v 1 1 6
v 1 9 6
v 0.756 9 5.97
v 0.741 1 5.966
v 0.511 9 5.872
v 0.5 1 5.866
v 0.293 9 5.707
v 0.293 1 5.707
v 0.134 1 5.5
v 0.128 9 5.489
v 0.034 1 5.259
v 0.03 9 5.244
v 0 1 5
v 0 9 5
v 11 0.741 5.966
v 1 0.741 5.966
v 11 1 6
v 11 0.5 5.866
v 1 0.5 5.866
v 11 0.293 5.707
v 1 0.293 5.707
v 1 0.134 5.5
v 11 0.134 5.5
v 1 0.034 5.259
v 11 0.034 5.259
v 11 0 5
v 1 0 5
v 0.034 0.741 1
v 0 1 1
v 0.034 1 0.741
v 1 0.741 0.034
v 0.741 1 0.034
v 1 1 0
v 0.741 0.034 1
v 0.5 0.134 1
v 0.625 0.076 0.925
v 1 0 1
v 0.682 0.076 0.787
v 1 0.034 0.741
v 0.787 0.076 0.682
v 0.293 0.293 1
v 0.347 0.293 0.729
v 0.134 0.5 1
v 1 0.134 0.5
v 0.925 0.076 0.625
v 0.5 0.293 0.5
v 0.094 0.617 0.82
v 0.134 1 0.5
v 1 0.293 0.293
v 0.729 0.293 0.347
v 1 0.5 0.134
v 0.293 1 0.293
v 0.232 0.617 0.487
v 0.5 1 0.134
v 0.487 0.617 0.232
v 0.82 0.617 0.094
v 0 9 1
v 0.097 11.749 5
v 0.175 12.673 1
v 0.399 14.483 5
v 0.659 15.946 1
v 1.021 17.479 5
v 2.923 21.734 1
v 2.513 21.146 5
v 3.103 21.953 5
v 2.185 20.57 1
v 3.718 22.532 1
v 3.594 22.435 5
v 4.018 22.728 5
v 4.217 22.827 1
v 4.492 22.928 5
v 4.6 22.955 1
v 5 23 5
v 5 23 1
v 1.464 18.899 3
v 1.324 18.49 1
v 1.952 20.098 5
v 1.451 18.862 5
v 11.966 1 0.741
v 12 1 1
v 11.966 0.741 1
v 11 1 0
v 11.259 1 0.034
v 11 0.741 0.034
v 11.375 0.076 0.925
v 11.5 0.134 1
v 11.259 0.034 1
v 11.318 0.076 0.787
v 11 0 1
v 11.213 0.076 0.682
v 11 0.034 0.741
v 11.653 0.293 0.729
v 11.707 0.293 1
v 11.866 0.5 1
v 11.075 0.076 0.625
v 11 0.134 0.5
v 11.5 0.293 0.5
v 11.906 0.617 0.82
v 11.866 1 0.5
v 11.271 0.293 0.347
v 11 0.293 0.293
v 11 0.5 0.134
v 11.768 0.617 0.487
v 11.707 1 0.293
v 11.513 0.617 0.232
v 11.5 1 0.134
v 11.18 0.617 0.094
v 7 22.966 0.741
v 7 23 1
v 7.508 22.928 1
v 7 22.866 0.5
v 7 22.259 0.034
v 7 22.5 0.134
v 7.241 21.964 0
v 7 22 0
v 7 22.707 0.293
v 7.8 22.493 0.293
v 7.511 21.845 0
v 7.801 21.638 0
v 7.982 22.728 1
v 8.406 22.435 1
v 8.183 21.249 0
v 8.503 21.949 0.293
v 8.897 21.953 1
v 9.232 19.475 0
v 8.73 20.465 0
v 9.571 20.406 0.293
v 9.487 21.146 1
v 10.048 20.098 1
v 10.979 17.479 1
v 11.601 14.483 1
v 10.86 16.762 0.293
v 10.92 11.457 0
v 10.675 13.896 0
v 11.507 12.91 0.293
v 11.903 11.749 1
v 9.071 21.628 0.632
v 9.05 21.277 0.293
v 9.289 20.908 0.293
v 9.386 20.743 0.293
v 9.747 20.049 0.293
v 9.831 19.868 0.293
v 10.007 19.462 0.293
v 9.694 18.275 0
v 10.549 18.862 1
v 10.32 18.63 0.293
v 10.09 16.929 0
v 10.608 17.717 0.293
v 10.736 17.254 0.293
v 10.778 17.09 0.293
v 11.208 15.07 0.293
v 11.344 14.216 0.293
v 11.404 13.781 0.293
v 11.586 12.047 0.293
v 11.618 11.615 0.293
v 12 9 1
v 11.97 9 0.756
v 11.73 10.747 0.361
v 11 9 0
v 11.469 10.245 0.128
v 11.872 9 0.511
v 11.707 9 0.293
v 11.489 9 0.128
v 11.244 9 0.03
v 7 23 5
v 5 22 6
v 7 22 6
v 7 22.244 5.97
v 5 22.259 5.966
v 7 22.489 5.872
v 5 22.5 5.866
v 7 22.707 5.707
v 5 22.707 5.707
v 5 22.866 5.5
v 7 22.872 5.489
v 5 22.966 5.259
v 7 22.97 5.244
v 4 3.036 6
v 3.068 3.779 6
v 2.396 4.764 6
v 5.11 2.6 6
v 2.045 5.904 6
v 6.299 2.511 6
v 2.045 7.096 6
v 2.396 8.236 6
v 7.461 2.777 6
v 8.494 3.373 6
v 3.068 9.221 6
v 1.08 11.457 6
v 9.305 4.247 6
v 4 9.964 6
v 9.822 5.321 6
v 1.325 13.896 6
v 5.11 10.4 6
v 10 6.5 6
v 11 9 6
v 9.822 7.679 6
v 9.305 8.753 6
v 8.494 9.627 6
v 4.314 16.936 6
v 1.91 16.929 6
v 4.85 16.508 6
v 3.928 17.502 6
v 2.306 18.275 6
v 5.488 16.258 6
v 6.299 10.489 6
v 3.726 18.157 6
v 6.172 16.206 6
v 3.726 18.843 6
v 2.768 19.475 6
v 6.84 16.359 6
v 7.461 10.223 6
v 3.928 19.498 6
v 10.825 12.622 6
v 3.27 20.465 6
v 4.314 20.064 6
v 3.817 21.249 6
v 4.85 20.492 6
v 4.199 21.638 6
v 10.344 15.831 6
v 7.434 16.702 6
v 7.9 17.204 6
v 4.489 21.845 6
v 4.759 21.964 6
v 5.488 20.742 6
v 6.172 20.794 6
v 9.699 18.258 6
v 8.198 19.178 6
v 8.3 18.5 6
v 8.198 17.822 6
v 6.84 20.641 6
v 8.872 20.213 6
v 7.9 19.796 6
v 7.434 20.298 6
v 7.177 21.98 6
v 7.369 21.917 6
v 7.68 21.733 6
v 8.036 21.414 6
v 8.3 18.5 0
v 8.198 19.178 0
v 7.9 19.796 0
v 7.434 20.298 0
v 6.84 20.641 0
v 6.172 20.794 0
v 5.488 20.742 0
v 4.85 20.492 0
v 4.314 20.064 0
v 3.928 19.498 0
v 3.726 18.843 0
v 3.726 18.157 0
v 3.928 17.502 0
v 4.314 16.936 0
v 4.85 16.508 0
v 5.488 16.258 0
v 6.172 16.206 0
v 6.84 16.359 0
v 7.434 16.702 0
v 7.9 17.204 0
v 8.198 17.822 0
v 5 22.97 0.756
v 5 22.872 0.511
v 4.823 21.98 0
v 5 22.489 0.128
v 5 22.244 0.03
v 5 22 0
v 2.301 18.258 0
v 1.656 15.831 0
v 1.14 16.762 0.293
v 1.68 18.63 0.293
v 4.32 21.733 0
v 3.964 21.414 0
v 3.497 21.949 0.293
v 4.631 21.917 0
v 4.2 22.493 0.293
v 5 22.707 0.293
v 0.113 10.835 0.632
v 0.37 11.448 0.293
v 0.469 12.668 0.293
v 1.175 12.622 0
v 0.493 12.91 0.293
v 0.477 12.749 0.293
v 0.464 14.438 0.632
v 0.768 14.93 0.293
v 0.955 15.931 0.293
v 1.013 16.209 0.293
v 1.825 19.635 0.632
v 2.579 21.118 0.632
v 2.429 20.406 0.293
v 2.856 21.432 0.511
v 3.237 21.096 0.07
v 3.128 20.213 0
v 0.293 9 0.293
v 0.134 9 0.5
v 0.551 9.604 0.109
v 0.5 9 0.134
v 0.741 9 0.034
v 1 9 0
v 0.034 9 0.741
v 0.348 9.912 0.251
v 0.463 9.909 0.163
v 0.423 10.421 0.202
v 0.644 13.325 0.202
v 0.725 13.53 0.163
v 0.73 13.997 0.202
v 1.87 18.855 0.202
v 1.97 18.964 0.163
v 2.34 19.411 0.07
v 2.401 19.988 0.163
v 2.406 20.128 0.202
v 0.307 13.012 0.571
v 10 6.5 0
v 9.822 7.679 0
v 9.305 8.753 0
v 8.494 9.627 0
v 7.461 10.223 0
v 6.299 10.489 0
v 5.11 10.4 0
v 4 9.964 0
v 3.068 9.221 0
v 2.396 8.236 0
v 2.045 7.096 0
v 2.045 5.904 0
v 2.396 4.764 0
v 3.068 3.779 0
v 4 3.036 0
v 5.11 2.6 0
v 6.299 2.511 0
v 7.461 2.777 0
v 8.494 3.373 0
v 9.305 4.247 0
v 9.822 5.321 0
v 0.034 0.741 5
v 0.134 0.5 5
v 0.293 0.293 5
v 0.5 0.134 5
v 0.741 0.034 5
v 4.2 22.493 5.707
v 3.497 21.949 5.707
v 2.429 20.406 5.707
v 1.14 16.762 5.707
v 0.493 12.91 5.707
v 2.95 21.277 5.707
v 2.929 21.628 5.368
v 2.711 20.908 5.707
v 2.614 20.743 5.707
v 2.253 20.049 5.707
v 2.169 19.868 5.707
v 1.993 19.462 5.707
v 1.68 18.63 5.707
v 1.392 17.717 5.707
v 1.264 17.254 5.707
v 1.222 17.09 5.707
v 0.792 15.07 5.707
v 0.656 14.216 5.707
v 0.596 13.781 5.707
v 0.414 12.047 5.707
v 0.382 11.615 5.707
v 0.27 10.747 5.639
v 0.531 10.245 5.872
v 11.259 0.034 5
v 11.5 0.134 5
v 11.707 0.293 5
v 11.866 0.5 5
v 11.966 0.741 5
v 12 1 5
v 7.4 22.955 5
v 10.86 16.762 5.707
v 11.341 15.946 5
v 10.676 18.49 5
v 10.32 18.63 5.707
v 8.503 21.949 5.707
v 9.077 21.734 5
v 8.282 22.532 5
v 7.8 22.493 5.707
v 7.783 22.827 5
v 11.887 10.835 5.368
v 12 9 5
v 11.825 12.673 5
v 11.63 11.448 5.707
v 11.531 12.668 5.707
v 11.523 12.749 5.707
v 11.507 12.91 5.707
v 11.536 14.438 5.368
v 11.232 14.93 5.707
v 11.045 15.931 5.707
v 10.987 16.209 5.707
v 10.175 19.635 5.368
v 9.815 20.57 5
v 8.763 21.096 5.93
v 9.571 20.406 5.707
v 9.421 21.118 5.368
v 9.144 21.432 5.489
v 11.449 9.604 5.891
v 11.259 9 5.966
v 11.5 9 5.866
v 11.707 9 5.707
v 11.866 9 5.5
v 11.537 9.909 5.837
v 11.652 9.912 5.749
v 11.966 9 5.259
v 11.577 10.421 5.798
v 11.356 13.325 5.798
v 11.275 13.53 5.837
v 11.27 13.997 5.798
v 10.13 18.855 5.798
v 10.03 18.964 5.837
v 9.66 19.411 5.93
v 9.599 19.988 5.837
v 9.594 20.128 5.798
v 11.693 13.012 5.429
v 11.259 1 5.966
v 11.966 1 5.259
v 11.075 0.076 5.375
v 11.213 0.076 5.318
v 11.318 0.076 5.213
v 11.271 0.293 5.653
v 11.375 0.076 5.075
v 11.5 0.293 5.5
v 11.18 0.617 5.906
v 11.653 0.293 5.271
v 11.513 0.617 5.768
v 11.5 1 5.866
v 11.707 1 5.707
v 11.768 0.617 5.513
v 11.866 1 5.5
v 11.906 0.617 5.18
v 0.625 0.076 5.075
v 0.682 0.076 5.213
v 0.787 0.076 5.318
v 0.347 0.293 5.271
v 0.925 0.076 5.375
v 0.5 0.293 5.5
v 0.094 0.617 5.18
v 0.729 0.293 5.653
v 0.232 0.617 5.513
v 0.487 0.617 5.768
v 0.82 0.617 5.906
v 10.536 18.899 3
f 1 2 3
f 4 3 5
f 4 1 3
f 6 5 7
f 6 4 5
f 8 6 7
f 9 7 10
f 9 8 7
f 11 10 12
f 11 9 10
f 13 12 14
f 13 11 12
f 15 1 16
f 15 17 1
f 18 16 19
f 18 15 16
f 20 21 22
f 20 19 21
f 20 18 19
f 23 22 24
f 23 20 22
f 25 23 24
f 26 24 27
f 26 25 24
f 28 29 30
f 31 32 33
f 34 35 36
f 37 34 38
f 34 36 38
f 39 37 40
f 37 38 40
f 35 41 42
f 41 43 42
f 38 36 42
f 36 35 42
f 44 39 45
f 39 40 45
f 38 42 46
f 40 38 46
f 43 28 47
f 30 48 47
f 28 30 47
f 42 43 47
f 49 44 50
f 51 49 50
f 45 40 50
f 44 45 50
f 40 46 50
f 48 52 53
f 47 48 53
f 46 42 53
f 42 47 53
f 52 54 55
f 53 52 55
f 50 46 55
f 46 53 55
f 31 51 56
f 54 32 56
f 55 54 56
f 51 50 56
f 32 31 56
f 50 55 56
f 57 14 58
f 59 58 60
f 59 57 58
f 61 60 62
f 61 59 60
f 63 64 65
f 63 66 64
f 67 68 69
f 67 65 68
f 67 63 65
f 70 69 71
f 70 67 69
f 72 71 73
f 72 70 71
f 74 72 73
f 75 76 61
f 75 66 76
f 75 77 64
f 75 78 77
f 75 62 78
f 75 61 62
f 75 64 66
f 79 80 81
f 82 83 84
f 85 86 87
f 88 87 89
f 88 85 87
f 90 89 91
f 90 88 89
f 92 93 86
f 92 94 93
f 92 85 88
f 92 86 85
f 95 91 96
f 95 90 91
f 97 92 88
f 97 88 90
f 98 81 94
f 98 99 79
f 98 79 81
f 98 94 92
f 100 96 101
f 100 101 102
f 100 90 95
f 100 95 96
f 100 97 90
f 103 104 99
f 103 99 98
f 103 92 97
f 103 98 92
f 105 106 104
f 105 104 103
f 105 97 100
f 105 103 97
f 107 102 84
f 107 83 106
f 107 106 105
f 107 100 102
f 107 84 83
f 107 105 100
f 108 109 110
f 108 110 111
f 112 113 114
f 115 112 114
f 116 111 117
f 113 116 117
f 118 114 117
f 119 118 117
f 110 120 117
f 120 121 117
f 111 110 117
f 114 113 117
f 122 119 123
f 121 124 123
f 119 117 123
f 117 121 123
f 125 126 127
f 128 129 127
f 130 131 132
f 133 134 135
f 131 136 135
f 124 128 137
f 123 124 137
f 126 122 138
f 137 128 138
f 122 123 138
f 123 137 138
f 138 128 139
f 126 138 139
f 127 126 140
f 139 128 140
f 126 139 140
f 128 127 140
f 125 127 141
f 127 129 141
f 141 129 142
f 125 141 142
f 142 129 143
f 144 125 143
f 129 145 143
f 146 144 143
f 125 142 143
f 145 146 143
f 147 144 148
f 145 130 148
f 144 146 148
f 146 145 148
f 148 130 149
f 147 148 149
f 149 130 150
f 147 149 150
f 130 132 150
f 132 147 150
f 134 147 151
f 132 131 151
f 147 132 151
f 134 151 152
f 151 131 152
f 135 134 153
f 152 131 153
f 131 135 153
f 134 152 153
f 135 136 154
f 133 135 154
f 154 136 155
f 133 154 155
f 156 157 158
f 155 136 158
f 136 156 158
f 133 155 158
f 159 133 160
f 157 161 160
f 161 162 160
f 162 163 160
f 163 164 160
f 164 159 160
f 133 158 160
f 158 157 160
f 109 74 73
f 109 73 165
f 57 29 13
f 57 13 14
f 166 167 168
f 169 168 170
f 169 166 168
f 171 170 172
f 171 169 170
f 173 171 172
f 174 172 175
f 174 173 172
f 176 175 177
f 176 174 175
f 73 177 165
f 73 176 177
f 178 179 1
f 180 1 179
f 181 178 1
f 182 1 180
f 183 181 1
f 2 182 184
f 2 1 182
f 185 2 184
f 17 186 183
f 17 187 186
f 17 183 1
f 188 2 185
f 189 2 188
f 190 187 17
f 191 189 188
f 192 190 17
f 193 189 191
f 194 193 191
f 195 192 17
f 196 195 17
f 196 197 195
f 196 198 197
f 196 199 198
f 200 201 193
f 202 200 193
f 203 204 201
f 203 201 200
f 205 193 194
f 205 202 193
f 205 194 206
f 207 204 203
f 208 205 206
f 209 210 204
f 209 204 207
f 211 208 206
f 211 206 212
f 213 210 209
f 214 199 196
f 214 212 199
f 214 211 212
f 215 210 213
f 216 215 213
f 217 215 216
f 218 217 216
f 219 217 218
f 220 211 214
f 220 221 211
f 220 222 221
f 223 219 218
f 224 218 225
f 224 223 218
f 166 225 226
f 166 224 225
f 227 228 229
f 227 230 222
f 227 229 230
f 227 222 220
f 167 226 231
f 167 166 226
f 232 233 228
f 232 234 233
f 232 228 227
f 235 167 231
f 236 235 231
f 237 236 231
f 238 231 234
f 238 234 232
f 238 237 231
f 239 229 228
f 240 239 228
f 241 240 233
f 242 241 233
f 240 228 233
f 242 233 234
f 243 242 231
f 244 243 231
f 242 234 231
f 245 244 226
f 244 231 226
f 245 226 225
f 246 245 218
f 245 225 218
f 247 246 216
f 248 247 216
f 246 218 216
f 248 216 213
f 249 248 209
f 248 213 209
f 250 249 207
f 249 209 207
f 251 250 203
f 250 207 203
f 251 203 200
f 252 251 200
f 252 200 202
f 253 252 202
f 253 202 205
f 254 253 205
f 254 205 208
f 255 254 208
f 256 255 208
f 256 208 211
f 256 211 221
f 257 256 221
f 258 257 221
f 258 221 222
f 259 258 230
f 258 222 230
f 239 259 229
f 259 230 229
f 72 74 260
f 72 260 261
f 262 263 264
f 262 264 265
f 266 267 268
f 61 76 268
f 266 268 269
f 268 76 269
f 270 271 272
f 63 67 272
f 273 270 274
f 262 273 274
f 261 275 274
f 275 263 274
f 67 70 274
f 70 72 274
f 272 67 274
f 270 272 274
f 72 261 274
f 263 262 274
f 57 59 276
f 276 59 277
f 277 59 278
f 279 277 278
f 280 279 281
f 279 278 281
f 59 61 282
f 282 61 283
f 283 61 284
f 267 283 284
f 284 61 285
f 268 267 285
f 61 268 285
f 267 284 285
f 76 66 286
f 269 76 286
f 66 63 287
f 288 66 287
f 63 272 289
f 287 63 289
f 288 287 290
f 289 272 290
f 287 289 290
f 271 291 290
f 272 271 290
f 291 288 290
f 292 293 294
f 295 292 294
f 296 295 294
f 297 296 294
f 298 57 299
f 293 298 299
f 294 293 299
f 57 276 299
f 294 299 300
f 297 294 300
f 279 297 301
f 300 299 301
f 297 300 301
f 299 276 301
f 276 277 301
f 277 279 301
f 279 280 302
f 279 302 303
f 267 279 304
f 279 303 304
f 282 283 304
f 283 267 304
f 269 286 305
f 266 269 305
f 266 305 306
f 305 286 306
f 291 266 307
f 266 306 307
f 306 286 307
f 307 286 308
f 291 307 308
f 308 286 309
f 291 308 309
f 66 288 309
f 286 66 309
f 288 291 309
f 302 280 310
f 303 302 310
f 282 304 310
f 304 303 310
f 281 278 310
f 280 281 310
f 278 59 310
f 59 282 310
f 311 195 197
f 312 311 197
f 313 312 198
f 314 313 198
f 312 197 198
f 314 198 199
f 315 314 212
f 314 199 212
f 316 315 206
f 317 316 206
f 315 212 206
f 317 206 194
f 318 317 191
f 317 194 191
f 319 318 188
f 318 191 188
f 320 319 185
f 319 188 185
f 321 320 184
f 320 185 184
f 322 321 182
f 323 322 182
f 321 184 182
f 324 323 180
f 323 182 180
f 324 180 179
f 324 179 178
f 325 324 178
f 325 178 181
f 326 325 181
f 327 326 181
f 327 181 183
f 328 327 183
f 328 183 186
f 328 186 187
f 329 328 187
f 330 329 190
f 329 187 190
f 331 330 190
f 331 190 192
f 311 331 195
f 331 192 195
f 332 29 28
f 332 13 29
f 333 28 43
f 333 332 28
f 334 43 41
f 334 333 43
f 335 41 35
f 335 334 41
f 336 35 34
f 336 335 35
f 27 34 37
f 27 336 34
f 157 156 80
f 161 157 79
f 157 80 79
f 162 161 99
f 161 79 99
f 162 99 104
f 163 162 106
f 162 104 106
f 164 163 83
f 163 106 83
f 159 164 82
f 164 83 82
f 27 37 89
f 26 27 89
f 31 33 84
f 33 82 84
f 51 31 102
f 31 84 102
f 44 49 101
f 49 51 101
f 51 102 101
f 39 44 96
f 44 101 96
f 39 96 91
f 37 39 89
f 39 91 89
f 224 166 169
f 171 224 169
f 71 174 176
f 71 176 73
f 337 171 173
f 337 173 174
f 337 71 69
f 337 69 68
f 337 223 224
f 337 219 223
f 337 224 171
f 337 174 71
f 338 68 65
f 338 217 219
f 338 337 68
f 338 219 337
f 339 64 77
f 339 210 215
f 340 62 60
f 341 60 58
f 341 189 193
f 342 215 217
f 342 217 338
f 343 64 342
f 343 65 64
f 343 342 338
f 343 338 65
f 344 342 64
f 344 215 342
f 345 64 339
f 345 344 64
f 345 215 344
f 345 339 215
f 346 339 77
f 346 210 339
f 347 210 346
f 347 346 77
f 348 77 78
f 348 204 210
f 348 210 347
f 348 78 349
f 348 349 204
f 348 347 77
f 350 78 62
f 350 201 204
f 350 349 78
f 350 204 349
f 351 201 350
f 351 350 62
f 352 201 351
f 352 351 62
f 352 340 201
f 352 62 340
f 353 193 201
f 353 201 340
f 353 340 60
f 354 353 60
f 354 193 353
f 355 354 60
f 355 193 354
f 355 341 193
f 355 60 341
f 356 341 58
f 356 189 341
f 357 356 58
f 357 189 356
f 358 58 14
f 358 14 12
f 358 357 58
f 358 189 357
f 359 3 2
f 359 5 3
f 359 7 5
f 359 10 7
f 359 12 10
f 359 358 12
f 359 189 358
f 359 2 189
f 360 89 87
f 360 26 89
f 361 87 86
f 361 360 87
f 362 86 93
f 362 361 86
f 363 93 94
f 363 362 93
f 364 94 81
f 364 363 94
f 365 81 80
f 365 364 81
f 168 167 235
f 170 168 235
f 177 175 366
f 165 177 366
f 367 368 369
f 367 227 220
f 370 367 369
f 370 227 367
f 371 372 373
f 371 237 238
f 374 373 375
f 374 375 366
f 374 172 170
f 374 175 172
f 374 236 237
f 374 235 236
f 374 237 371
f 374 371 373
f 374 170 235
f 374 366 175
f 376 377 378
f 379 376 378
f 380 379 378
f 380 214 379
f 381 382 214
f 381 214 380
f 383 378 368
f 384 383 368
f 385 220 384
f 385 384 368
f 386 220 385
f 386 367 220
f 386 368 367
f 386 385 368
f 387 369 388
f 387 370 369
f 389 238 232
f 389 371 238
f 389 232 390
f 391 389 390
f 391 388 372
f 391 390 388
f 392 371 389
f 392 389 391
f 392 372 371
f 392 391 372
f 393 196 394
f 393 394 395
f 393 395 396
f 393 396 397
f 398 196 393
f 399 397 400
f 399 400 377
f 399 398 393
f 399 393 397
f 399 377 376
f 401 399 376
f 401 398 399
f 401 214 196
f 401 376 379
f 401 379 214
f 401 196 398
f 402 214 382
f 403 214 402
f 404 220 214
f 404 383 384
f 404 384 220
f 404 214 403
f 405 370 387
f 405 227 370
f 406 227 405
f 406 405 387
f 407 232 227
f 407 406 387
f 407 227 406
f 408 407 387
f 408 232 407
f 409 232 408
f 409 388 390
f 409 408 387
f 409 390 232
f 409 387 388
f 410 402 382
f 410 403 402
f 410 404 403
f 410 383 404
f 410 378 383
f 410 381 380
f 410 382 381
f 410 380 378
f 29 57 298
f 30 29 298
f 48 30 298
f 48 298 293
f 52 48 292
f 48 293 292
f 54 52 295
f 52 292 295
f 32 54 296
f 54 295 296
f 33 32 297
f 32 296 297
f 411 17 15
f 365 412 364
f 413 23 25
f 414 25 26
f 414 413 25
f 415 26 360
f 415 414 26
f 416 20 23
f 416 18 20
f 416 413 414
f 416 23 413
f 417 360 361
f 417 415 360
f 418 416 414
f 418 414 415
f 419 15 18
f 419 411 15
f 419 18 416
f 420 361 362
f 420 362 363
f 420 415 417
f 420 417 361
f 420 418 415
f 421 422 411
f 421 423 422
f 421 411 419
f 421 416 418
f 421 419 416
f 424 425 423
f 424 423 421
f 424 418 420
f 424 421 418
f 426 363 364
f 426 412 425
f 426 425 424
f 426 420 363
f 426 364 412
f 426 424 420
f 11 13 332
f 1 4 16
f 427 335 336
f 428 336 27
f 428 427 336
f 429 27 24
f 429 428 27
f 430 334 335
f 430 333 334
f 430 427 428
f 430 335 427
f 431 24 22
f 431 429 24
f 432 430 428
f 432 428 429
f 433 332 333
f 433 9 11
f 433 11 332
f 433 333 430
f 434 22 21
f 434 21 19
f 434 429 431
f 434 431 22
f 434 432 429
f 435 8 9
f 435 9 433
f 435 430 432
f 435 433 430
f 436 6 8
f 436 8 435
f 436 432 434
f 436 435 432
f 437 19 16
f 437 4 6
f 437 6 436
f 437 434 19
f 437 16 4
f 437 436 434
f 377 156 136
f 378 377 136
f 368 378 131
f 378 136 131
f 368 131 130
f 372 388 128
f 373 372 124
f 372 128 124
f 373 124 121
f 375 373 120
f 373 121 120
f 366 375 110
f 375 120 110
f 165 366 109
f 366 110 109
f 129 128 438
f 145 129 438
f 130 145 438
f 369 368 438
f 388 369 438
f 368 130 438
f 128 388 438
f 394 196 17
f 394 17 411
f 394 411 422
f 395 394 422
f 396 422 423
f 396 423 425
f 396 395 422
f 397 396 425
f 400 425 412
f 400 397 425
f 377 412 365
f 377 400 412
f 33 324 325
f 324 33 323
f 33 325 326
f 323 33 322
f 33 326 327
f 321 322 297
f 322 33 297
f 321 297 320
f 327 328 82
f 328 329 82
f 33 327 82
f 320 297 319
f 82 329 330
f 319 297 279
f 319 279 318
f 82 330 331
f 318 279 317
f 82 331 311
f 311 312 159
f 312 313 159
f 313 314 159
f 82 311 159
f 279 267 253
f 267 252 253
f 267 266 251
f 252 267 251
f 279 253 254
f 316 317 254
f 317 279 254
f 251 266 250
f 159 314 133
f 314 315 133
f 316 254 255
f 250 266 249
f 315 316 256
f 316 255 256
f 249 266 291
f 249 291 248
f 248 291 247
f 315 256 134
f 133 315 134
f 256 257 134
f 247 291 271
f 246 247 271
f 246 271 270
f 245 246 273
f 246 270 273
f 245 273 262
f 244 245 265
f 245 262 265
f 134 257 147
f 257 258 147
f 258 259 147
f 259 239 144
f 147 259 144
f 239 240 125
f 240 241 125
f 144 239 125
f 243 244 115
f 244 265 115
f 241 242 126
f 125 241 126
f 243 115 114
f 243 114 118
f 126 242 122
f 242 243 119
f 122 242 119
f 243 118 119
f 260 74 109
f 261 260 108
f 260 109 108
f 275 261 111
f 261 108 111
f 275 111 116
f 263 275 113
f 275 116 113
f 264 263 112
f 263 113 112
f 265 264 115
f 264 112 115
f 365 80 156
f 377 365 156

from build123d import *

# Parameters (mm, degrees)
SKETCH1_W            = 12
SKETCH1_H            = 23
BOSS_EXTRUDE1_DEPTH  = 6
SKETCH2_R            = 2.3
SKETCH2_R_2          = 4
CUT_EXTRUDE1_DEPTH   = 6
TAPER_FILLET_SIZE    = 14
TAPER_FILLET_SIZE_2  = 5
TAPER_FILLET2_SIZE   = 14
TAPER_FILLET2_SIZE_2 = 5
EDGE_FILLETS_R       = 1


with BuildPart() as part:
    # Sketch1 → Boss-Extrude1 (new body)
    with BuildSketch(Plane.XY):
        with Locations((6, 11.5)):
            Rectangle(SKETCH1_W, SKETCH1_H)
    extrude(amount=BOSS_EXTRUDE1_DEPTH)

    # Sketch2 → Cut-Extrude1 (cut)
    with BuildSketch(Plane.XY.offset(6)):
        with Locations((6, 18.5)):
            Circle(SKETCH2_R)
        with Locations((6, 6.5)):
            Circle(SKETCH2_R_2)
    extrude(amount=-CUT_EXTRUDE1_DEPTH, mode=Mode.SUBTRACT)

    # taper_fillet
    # an asymmetric fillet: 14, 5 mm, written as the material it takes off along each edge
    with BuildSketch(Plane(origin=(0, 23, -35), x_dir=(0, -1, 0), z_dir=(0, 0, 1))) as taper_fillet_piece_1:
        with BuildLine():
            Bezier((TAPER_FILLET_SIZE, 0), (0, 0), (0, TAPER_FILLET_SIZE_2), weights=[1, 0.707106781, 1])
            Line((0, TAPER_FILLET_SIZE_2), (0, 0))
            Line((0, 0), (TAPER_FILLET_SIZE, 0))
        make_face()
    extrude(amount=76, mode=Mode.SUBTRACT)

    # taper_fillet2
    # an asymmetric fillet: 14, 5 mm, written as the material it takes off along each edge
    with BuildSketch(Plane(origin=(12, 23, -35), x_dir=(0, -1, 0), z_dir=(0, 0, 1))) as taper_fillet2_piece_1:
        with BuildLine():
            Bezier((TAPER_FILLET2_SIZE, 0), (0, 0), (0, -TAPER_FILLET2_SIZE_2), weights=[1, 0.707106781, 1])
            Line((0, -TAPER_FILLET2_SIZE_2), (0, 0))
            Line((0, 0), (TAPER_FILLET2_SIZE, 0))
        make_face()
    extrude(amount=76, mode=Mode.SUBTRACT)

    # edge_fillets
    edge_fillets_edges = [part.edges().sort_by_distance(p)[0] for p in [
        (0, 4.5, 0),
        (0.853211897, 16.822053684, 0),
        (6, 23, 0),
        (12, 4.5, 0),
        (12, 4.5, 6),
        (0, 4.5, 6),
        (0.853211897, 16.822053684, 6),
        (6, 23, 6),
        (0, 0, 3),
        (6, 0, 6),
        (12, 0, 3),
        (6, 0, 0),
        (11.146788103, 16.822053684, 0),
        (11.146788103, 16.822053684, 6),
    ]]
    fillet(edge_fillets_edges, radius=EDGE_FILLETS_R)


solid = part.part
